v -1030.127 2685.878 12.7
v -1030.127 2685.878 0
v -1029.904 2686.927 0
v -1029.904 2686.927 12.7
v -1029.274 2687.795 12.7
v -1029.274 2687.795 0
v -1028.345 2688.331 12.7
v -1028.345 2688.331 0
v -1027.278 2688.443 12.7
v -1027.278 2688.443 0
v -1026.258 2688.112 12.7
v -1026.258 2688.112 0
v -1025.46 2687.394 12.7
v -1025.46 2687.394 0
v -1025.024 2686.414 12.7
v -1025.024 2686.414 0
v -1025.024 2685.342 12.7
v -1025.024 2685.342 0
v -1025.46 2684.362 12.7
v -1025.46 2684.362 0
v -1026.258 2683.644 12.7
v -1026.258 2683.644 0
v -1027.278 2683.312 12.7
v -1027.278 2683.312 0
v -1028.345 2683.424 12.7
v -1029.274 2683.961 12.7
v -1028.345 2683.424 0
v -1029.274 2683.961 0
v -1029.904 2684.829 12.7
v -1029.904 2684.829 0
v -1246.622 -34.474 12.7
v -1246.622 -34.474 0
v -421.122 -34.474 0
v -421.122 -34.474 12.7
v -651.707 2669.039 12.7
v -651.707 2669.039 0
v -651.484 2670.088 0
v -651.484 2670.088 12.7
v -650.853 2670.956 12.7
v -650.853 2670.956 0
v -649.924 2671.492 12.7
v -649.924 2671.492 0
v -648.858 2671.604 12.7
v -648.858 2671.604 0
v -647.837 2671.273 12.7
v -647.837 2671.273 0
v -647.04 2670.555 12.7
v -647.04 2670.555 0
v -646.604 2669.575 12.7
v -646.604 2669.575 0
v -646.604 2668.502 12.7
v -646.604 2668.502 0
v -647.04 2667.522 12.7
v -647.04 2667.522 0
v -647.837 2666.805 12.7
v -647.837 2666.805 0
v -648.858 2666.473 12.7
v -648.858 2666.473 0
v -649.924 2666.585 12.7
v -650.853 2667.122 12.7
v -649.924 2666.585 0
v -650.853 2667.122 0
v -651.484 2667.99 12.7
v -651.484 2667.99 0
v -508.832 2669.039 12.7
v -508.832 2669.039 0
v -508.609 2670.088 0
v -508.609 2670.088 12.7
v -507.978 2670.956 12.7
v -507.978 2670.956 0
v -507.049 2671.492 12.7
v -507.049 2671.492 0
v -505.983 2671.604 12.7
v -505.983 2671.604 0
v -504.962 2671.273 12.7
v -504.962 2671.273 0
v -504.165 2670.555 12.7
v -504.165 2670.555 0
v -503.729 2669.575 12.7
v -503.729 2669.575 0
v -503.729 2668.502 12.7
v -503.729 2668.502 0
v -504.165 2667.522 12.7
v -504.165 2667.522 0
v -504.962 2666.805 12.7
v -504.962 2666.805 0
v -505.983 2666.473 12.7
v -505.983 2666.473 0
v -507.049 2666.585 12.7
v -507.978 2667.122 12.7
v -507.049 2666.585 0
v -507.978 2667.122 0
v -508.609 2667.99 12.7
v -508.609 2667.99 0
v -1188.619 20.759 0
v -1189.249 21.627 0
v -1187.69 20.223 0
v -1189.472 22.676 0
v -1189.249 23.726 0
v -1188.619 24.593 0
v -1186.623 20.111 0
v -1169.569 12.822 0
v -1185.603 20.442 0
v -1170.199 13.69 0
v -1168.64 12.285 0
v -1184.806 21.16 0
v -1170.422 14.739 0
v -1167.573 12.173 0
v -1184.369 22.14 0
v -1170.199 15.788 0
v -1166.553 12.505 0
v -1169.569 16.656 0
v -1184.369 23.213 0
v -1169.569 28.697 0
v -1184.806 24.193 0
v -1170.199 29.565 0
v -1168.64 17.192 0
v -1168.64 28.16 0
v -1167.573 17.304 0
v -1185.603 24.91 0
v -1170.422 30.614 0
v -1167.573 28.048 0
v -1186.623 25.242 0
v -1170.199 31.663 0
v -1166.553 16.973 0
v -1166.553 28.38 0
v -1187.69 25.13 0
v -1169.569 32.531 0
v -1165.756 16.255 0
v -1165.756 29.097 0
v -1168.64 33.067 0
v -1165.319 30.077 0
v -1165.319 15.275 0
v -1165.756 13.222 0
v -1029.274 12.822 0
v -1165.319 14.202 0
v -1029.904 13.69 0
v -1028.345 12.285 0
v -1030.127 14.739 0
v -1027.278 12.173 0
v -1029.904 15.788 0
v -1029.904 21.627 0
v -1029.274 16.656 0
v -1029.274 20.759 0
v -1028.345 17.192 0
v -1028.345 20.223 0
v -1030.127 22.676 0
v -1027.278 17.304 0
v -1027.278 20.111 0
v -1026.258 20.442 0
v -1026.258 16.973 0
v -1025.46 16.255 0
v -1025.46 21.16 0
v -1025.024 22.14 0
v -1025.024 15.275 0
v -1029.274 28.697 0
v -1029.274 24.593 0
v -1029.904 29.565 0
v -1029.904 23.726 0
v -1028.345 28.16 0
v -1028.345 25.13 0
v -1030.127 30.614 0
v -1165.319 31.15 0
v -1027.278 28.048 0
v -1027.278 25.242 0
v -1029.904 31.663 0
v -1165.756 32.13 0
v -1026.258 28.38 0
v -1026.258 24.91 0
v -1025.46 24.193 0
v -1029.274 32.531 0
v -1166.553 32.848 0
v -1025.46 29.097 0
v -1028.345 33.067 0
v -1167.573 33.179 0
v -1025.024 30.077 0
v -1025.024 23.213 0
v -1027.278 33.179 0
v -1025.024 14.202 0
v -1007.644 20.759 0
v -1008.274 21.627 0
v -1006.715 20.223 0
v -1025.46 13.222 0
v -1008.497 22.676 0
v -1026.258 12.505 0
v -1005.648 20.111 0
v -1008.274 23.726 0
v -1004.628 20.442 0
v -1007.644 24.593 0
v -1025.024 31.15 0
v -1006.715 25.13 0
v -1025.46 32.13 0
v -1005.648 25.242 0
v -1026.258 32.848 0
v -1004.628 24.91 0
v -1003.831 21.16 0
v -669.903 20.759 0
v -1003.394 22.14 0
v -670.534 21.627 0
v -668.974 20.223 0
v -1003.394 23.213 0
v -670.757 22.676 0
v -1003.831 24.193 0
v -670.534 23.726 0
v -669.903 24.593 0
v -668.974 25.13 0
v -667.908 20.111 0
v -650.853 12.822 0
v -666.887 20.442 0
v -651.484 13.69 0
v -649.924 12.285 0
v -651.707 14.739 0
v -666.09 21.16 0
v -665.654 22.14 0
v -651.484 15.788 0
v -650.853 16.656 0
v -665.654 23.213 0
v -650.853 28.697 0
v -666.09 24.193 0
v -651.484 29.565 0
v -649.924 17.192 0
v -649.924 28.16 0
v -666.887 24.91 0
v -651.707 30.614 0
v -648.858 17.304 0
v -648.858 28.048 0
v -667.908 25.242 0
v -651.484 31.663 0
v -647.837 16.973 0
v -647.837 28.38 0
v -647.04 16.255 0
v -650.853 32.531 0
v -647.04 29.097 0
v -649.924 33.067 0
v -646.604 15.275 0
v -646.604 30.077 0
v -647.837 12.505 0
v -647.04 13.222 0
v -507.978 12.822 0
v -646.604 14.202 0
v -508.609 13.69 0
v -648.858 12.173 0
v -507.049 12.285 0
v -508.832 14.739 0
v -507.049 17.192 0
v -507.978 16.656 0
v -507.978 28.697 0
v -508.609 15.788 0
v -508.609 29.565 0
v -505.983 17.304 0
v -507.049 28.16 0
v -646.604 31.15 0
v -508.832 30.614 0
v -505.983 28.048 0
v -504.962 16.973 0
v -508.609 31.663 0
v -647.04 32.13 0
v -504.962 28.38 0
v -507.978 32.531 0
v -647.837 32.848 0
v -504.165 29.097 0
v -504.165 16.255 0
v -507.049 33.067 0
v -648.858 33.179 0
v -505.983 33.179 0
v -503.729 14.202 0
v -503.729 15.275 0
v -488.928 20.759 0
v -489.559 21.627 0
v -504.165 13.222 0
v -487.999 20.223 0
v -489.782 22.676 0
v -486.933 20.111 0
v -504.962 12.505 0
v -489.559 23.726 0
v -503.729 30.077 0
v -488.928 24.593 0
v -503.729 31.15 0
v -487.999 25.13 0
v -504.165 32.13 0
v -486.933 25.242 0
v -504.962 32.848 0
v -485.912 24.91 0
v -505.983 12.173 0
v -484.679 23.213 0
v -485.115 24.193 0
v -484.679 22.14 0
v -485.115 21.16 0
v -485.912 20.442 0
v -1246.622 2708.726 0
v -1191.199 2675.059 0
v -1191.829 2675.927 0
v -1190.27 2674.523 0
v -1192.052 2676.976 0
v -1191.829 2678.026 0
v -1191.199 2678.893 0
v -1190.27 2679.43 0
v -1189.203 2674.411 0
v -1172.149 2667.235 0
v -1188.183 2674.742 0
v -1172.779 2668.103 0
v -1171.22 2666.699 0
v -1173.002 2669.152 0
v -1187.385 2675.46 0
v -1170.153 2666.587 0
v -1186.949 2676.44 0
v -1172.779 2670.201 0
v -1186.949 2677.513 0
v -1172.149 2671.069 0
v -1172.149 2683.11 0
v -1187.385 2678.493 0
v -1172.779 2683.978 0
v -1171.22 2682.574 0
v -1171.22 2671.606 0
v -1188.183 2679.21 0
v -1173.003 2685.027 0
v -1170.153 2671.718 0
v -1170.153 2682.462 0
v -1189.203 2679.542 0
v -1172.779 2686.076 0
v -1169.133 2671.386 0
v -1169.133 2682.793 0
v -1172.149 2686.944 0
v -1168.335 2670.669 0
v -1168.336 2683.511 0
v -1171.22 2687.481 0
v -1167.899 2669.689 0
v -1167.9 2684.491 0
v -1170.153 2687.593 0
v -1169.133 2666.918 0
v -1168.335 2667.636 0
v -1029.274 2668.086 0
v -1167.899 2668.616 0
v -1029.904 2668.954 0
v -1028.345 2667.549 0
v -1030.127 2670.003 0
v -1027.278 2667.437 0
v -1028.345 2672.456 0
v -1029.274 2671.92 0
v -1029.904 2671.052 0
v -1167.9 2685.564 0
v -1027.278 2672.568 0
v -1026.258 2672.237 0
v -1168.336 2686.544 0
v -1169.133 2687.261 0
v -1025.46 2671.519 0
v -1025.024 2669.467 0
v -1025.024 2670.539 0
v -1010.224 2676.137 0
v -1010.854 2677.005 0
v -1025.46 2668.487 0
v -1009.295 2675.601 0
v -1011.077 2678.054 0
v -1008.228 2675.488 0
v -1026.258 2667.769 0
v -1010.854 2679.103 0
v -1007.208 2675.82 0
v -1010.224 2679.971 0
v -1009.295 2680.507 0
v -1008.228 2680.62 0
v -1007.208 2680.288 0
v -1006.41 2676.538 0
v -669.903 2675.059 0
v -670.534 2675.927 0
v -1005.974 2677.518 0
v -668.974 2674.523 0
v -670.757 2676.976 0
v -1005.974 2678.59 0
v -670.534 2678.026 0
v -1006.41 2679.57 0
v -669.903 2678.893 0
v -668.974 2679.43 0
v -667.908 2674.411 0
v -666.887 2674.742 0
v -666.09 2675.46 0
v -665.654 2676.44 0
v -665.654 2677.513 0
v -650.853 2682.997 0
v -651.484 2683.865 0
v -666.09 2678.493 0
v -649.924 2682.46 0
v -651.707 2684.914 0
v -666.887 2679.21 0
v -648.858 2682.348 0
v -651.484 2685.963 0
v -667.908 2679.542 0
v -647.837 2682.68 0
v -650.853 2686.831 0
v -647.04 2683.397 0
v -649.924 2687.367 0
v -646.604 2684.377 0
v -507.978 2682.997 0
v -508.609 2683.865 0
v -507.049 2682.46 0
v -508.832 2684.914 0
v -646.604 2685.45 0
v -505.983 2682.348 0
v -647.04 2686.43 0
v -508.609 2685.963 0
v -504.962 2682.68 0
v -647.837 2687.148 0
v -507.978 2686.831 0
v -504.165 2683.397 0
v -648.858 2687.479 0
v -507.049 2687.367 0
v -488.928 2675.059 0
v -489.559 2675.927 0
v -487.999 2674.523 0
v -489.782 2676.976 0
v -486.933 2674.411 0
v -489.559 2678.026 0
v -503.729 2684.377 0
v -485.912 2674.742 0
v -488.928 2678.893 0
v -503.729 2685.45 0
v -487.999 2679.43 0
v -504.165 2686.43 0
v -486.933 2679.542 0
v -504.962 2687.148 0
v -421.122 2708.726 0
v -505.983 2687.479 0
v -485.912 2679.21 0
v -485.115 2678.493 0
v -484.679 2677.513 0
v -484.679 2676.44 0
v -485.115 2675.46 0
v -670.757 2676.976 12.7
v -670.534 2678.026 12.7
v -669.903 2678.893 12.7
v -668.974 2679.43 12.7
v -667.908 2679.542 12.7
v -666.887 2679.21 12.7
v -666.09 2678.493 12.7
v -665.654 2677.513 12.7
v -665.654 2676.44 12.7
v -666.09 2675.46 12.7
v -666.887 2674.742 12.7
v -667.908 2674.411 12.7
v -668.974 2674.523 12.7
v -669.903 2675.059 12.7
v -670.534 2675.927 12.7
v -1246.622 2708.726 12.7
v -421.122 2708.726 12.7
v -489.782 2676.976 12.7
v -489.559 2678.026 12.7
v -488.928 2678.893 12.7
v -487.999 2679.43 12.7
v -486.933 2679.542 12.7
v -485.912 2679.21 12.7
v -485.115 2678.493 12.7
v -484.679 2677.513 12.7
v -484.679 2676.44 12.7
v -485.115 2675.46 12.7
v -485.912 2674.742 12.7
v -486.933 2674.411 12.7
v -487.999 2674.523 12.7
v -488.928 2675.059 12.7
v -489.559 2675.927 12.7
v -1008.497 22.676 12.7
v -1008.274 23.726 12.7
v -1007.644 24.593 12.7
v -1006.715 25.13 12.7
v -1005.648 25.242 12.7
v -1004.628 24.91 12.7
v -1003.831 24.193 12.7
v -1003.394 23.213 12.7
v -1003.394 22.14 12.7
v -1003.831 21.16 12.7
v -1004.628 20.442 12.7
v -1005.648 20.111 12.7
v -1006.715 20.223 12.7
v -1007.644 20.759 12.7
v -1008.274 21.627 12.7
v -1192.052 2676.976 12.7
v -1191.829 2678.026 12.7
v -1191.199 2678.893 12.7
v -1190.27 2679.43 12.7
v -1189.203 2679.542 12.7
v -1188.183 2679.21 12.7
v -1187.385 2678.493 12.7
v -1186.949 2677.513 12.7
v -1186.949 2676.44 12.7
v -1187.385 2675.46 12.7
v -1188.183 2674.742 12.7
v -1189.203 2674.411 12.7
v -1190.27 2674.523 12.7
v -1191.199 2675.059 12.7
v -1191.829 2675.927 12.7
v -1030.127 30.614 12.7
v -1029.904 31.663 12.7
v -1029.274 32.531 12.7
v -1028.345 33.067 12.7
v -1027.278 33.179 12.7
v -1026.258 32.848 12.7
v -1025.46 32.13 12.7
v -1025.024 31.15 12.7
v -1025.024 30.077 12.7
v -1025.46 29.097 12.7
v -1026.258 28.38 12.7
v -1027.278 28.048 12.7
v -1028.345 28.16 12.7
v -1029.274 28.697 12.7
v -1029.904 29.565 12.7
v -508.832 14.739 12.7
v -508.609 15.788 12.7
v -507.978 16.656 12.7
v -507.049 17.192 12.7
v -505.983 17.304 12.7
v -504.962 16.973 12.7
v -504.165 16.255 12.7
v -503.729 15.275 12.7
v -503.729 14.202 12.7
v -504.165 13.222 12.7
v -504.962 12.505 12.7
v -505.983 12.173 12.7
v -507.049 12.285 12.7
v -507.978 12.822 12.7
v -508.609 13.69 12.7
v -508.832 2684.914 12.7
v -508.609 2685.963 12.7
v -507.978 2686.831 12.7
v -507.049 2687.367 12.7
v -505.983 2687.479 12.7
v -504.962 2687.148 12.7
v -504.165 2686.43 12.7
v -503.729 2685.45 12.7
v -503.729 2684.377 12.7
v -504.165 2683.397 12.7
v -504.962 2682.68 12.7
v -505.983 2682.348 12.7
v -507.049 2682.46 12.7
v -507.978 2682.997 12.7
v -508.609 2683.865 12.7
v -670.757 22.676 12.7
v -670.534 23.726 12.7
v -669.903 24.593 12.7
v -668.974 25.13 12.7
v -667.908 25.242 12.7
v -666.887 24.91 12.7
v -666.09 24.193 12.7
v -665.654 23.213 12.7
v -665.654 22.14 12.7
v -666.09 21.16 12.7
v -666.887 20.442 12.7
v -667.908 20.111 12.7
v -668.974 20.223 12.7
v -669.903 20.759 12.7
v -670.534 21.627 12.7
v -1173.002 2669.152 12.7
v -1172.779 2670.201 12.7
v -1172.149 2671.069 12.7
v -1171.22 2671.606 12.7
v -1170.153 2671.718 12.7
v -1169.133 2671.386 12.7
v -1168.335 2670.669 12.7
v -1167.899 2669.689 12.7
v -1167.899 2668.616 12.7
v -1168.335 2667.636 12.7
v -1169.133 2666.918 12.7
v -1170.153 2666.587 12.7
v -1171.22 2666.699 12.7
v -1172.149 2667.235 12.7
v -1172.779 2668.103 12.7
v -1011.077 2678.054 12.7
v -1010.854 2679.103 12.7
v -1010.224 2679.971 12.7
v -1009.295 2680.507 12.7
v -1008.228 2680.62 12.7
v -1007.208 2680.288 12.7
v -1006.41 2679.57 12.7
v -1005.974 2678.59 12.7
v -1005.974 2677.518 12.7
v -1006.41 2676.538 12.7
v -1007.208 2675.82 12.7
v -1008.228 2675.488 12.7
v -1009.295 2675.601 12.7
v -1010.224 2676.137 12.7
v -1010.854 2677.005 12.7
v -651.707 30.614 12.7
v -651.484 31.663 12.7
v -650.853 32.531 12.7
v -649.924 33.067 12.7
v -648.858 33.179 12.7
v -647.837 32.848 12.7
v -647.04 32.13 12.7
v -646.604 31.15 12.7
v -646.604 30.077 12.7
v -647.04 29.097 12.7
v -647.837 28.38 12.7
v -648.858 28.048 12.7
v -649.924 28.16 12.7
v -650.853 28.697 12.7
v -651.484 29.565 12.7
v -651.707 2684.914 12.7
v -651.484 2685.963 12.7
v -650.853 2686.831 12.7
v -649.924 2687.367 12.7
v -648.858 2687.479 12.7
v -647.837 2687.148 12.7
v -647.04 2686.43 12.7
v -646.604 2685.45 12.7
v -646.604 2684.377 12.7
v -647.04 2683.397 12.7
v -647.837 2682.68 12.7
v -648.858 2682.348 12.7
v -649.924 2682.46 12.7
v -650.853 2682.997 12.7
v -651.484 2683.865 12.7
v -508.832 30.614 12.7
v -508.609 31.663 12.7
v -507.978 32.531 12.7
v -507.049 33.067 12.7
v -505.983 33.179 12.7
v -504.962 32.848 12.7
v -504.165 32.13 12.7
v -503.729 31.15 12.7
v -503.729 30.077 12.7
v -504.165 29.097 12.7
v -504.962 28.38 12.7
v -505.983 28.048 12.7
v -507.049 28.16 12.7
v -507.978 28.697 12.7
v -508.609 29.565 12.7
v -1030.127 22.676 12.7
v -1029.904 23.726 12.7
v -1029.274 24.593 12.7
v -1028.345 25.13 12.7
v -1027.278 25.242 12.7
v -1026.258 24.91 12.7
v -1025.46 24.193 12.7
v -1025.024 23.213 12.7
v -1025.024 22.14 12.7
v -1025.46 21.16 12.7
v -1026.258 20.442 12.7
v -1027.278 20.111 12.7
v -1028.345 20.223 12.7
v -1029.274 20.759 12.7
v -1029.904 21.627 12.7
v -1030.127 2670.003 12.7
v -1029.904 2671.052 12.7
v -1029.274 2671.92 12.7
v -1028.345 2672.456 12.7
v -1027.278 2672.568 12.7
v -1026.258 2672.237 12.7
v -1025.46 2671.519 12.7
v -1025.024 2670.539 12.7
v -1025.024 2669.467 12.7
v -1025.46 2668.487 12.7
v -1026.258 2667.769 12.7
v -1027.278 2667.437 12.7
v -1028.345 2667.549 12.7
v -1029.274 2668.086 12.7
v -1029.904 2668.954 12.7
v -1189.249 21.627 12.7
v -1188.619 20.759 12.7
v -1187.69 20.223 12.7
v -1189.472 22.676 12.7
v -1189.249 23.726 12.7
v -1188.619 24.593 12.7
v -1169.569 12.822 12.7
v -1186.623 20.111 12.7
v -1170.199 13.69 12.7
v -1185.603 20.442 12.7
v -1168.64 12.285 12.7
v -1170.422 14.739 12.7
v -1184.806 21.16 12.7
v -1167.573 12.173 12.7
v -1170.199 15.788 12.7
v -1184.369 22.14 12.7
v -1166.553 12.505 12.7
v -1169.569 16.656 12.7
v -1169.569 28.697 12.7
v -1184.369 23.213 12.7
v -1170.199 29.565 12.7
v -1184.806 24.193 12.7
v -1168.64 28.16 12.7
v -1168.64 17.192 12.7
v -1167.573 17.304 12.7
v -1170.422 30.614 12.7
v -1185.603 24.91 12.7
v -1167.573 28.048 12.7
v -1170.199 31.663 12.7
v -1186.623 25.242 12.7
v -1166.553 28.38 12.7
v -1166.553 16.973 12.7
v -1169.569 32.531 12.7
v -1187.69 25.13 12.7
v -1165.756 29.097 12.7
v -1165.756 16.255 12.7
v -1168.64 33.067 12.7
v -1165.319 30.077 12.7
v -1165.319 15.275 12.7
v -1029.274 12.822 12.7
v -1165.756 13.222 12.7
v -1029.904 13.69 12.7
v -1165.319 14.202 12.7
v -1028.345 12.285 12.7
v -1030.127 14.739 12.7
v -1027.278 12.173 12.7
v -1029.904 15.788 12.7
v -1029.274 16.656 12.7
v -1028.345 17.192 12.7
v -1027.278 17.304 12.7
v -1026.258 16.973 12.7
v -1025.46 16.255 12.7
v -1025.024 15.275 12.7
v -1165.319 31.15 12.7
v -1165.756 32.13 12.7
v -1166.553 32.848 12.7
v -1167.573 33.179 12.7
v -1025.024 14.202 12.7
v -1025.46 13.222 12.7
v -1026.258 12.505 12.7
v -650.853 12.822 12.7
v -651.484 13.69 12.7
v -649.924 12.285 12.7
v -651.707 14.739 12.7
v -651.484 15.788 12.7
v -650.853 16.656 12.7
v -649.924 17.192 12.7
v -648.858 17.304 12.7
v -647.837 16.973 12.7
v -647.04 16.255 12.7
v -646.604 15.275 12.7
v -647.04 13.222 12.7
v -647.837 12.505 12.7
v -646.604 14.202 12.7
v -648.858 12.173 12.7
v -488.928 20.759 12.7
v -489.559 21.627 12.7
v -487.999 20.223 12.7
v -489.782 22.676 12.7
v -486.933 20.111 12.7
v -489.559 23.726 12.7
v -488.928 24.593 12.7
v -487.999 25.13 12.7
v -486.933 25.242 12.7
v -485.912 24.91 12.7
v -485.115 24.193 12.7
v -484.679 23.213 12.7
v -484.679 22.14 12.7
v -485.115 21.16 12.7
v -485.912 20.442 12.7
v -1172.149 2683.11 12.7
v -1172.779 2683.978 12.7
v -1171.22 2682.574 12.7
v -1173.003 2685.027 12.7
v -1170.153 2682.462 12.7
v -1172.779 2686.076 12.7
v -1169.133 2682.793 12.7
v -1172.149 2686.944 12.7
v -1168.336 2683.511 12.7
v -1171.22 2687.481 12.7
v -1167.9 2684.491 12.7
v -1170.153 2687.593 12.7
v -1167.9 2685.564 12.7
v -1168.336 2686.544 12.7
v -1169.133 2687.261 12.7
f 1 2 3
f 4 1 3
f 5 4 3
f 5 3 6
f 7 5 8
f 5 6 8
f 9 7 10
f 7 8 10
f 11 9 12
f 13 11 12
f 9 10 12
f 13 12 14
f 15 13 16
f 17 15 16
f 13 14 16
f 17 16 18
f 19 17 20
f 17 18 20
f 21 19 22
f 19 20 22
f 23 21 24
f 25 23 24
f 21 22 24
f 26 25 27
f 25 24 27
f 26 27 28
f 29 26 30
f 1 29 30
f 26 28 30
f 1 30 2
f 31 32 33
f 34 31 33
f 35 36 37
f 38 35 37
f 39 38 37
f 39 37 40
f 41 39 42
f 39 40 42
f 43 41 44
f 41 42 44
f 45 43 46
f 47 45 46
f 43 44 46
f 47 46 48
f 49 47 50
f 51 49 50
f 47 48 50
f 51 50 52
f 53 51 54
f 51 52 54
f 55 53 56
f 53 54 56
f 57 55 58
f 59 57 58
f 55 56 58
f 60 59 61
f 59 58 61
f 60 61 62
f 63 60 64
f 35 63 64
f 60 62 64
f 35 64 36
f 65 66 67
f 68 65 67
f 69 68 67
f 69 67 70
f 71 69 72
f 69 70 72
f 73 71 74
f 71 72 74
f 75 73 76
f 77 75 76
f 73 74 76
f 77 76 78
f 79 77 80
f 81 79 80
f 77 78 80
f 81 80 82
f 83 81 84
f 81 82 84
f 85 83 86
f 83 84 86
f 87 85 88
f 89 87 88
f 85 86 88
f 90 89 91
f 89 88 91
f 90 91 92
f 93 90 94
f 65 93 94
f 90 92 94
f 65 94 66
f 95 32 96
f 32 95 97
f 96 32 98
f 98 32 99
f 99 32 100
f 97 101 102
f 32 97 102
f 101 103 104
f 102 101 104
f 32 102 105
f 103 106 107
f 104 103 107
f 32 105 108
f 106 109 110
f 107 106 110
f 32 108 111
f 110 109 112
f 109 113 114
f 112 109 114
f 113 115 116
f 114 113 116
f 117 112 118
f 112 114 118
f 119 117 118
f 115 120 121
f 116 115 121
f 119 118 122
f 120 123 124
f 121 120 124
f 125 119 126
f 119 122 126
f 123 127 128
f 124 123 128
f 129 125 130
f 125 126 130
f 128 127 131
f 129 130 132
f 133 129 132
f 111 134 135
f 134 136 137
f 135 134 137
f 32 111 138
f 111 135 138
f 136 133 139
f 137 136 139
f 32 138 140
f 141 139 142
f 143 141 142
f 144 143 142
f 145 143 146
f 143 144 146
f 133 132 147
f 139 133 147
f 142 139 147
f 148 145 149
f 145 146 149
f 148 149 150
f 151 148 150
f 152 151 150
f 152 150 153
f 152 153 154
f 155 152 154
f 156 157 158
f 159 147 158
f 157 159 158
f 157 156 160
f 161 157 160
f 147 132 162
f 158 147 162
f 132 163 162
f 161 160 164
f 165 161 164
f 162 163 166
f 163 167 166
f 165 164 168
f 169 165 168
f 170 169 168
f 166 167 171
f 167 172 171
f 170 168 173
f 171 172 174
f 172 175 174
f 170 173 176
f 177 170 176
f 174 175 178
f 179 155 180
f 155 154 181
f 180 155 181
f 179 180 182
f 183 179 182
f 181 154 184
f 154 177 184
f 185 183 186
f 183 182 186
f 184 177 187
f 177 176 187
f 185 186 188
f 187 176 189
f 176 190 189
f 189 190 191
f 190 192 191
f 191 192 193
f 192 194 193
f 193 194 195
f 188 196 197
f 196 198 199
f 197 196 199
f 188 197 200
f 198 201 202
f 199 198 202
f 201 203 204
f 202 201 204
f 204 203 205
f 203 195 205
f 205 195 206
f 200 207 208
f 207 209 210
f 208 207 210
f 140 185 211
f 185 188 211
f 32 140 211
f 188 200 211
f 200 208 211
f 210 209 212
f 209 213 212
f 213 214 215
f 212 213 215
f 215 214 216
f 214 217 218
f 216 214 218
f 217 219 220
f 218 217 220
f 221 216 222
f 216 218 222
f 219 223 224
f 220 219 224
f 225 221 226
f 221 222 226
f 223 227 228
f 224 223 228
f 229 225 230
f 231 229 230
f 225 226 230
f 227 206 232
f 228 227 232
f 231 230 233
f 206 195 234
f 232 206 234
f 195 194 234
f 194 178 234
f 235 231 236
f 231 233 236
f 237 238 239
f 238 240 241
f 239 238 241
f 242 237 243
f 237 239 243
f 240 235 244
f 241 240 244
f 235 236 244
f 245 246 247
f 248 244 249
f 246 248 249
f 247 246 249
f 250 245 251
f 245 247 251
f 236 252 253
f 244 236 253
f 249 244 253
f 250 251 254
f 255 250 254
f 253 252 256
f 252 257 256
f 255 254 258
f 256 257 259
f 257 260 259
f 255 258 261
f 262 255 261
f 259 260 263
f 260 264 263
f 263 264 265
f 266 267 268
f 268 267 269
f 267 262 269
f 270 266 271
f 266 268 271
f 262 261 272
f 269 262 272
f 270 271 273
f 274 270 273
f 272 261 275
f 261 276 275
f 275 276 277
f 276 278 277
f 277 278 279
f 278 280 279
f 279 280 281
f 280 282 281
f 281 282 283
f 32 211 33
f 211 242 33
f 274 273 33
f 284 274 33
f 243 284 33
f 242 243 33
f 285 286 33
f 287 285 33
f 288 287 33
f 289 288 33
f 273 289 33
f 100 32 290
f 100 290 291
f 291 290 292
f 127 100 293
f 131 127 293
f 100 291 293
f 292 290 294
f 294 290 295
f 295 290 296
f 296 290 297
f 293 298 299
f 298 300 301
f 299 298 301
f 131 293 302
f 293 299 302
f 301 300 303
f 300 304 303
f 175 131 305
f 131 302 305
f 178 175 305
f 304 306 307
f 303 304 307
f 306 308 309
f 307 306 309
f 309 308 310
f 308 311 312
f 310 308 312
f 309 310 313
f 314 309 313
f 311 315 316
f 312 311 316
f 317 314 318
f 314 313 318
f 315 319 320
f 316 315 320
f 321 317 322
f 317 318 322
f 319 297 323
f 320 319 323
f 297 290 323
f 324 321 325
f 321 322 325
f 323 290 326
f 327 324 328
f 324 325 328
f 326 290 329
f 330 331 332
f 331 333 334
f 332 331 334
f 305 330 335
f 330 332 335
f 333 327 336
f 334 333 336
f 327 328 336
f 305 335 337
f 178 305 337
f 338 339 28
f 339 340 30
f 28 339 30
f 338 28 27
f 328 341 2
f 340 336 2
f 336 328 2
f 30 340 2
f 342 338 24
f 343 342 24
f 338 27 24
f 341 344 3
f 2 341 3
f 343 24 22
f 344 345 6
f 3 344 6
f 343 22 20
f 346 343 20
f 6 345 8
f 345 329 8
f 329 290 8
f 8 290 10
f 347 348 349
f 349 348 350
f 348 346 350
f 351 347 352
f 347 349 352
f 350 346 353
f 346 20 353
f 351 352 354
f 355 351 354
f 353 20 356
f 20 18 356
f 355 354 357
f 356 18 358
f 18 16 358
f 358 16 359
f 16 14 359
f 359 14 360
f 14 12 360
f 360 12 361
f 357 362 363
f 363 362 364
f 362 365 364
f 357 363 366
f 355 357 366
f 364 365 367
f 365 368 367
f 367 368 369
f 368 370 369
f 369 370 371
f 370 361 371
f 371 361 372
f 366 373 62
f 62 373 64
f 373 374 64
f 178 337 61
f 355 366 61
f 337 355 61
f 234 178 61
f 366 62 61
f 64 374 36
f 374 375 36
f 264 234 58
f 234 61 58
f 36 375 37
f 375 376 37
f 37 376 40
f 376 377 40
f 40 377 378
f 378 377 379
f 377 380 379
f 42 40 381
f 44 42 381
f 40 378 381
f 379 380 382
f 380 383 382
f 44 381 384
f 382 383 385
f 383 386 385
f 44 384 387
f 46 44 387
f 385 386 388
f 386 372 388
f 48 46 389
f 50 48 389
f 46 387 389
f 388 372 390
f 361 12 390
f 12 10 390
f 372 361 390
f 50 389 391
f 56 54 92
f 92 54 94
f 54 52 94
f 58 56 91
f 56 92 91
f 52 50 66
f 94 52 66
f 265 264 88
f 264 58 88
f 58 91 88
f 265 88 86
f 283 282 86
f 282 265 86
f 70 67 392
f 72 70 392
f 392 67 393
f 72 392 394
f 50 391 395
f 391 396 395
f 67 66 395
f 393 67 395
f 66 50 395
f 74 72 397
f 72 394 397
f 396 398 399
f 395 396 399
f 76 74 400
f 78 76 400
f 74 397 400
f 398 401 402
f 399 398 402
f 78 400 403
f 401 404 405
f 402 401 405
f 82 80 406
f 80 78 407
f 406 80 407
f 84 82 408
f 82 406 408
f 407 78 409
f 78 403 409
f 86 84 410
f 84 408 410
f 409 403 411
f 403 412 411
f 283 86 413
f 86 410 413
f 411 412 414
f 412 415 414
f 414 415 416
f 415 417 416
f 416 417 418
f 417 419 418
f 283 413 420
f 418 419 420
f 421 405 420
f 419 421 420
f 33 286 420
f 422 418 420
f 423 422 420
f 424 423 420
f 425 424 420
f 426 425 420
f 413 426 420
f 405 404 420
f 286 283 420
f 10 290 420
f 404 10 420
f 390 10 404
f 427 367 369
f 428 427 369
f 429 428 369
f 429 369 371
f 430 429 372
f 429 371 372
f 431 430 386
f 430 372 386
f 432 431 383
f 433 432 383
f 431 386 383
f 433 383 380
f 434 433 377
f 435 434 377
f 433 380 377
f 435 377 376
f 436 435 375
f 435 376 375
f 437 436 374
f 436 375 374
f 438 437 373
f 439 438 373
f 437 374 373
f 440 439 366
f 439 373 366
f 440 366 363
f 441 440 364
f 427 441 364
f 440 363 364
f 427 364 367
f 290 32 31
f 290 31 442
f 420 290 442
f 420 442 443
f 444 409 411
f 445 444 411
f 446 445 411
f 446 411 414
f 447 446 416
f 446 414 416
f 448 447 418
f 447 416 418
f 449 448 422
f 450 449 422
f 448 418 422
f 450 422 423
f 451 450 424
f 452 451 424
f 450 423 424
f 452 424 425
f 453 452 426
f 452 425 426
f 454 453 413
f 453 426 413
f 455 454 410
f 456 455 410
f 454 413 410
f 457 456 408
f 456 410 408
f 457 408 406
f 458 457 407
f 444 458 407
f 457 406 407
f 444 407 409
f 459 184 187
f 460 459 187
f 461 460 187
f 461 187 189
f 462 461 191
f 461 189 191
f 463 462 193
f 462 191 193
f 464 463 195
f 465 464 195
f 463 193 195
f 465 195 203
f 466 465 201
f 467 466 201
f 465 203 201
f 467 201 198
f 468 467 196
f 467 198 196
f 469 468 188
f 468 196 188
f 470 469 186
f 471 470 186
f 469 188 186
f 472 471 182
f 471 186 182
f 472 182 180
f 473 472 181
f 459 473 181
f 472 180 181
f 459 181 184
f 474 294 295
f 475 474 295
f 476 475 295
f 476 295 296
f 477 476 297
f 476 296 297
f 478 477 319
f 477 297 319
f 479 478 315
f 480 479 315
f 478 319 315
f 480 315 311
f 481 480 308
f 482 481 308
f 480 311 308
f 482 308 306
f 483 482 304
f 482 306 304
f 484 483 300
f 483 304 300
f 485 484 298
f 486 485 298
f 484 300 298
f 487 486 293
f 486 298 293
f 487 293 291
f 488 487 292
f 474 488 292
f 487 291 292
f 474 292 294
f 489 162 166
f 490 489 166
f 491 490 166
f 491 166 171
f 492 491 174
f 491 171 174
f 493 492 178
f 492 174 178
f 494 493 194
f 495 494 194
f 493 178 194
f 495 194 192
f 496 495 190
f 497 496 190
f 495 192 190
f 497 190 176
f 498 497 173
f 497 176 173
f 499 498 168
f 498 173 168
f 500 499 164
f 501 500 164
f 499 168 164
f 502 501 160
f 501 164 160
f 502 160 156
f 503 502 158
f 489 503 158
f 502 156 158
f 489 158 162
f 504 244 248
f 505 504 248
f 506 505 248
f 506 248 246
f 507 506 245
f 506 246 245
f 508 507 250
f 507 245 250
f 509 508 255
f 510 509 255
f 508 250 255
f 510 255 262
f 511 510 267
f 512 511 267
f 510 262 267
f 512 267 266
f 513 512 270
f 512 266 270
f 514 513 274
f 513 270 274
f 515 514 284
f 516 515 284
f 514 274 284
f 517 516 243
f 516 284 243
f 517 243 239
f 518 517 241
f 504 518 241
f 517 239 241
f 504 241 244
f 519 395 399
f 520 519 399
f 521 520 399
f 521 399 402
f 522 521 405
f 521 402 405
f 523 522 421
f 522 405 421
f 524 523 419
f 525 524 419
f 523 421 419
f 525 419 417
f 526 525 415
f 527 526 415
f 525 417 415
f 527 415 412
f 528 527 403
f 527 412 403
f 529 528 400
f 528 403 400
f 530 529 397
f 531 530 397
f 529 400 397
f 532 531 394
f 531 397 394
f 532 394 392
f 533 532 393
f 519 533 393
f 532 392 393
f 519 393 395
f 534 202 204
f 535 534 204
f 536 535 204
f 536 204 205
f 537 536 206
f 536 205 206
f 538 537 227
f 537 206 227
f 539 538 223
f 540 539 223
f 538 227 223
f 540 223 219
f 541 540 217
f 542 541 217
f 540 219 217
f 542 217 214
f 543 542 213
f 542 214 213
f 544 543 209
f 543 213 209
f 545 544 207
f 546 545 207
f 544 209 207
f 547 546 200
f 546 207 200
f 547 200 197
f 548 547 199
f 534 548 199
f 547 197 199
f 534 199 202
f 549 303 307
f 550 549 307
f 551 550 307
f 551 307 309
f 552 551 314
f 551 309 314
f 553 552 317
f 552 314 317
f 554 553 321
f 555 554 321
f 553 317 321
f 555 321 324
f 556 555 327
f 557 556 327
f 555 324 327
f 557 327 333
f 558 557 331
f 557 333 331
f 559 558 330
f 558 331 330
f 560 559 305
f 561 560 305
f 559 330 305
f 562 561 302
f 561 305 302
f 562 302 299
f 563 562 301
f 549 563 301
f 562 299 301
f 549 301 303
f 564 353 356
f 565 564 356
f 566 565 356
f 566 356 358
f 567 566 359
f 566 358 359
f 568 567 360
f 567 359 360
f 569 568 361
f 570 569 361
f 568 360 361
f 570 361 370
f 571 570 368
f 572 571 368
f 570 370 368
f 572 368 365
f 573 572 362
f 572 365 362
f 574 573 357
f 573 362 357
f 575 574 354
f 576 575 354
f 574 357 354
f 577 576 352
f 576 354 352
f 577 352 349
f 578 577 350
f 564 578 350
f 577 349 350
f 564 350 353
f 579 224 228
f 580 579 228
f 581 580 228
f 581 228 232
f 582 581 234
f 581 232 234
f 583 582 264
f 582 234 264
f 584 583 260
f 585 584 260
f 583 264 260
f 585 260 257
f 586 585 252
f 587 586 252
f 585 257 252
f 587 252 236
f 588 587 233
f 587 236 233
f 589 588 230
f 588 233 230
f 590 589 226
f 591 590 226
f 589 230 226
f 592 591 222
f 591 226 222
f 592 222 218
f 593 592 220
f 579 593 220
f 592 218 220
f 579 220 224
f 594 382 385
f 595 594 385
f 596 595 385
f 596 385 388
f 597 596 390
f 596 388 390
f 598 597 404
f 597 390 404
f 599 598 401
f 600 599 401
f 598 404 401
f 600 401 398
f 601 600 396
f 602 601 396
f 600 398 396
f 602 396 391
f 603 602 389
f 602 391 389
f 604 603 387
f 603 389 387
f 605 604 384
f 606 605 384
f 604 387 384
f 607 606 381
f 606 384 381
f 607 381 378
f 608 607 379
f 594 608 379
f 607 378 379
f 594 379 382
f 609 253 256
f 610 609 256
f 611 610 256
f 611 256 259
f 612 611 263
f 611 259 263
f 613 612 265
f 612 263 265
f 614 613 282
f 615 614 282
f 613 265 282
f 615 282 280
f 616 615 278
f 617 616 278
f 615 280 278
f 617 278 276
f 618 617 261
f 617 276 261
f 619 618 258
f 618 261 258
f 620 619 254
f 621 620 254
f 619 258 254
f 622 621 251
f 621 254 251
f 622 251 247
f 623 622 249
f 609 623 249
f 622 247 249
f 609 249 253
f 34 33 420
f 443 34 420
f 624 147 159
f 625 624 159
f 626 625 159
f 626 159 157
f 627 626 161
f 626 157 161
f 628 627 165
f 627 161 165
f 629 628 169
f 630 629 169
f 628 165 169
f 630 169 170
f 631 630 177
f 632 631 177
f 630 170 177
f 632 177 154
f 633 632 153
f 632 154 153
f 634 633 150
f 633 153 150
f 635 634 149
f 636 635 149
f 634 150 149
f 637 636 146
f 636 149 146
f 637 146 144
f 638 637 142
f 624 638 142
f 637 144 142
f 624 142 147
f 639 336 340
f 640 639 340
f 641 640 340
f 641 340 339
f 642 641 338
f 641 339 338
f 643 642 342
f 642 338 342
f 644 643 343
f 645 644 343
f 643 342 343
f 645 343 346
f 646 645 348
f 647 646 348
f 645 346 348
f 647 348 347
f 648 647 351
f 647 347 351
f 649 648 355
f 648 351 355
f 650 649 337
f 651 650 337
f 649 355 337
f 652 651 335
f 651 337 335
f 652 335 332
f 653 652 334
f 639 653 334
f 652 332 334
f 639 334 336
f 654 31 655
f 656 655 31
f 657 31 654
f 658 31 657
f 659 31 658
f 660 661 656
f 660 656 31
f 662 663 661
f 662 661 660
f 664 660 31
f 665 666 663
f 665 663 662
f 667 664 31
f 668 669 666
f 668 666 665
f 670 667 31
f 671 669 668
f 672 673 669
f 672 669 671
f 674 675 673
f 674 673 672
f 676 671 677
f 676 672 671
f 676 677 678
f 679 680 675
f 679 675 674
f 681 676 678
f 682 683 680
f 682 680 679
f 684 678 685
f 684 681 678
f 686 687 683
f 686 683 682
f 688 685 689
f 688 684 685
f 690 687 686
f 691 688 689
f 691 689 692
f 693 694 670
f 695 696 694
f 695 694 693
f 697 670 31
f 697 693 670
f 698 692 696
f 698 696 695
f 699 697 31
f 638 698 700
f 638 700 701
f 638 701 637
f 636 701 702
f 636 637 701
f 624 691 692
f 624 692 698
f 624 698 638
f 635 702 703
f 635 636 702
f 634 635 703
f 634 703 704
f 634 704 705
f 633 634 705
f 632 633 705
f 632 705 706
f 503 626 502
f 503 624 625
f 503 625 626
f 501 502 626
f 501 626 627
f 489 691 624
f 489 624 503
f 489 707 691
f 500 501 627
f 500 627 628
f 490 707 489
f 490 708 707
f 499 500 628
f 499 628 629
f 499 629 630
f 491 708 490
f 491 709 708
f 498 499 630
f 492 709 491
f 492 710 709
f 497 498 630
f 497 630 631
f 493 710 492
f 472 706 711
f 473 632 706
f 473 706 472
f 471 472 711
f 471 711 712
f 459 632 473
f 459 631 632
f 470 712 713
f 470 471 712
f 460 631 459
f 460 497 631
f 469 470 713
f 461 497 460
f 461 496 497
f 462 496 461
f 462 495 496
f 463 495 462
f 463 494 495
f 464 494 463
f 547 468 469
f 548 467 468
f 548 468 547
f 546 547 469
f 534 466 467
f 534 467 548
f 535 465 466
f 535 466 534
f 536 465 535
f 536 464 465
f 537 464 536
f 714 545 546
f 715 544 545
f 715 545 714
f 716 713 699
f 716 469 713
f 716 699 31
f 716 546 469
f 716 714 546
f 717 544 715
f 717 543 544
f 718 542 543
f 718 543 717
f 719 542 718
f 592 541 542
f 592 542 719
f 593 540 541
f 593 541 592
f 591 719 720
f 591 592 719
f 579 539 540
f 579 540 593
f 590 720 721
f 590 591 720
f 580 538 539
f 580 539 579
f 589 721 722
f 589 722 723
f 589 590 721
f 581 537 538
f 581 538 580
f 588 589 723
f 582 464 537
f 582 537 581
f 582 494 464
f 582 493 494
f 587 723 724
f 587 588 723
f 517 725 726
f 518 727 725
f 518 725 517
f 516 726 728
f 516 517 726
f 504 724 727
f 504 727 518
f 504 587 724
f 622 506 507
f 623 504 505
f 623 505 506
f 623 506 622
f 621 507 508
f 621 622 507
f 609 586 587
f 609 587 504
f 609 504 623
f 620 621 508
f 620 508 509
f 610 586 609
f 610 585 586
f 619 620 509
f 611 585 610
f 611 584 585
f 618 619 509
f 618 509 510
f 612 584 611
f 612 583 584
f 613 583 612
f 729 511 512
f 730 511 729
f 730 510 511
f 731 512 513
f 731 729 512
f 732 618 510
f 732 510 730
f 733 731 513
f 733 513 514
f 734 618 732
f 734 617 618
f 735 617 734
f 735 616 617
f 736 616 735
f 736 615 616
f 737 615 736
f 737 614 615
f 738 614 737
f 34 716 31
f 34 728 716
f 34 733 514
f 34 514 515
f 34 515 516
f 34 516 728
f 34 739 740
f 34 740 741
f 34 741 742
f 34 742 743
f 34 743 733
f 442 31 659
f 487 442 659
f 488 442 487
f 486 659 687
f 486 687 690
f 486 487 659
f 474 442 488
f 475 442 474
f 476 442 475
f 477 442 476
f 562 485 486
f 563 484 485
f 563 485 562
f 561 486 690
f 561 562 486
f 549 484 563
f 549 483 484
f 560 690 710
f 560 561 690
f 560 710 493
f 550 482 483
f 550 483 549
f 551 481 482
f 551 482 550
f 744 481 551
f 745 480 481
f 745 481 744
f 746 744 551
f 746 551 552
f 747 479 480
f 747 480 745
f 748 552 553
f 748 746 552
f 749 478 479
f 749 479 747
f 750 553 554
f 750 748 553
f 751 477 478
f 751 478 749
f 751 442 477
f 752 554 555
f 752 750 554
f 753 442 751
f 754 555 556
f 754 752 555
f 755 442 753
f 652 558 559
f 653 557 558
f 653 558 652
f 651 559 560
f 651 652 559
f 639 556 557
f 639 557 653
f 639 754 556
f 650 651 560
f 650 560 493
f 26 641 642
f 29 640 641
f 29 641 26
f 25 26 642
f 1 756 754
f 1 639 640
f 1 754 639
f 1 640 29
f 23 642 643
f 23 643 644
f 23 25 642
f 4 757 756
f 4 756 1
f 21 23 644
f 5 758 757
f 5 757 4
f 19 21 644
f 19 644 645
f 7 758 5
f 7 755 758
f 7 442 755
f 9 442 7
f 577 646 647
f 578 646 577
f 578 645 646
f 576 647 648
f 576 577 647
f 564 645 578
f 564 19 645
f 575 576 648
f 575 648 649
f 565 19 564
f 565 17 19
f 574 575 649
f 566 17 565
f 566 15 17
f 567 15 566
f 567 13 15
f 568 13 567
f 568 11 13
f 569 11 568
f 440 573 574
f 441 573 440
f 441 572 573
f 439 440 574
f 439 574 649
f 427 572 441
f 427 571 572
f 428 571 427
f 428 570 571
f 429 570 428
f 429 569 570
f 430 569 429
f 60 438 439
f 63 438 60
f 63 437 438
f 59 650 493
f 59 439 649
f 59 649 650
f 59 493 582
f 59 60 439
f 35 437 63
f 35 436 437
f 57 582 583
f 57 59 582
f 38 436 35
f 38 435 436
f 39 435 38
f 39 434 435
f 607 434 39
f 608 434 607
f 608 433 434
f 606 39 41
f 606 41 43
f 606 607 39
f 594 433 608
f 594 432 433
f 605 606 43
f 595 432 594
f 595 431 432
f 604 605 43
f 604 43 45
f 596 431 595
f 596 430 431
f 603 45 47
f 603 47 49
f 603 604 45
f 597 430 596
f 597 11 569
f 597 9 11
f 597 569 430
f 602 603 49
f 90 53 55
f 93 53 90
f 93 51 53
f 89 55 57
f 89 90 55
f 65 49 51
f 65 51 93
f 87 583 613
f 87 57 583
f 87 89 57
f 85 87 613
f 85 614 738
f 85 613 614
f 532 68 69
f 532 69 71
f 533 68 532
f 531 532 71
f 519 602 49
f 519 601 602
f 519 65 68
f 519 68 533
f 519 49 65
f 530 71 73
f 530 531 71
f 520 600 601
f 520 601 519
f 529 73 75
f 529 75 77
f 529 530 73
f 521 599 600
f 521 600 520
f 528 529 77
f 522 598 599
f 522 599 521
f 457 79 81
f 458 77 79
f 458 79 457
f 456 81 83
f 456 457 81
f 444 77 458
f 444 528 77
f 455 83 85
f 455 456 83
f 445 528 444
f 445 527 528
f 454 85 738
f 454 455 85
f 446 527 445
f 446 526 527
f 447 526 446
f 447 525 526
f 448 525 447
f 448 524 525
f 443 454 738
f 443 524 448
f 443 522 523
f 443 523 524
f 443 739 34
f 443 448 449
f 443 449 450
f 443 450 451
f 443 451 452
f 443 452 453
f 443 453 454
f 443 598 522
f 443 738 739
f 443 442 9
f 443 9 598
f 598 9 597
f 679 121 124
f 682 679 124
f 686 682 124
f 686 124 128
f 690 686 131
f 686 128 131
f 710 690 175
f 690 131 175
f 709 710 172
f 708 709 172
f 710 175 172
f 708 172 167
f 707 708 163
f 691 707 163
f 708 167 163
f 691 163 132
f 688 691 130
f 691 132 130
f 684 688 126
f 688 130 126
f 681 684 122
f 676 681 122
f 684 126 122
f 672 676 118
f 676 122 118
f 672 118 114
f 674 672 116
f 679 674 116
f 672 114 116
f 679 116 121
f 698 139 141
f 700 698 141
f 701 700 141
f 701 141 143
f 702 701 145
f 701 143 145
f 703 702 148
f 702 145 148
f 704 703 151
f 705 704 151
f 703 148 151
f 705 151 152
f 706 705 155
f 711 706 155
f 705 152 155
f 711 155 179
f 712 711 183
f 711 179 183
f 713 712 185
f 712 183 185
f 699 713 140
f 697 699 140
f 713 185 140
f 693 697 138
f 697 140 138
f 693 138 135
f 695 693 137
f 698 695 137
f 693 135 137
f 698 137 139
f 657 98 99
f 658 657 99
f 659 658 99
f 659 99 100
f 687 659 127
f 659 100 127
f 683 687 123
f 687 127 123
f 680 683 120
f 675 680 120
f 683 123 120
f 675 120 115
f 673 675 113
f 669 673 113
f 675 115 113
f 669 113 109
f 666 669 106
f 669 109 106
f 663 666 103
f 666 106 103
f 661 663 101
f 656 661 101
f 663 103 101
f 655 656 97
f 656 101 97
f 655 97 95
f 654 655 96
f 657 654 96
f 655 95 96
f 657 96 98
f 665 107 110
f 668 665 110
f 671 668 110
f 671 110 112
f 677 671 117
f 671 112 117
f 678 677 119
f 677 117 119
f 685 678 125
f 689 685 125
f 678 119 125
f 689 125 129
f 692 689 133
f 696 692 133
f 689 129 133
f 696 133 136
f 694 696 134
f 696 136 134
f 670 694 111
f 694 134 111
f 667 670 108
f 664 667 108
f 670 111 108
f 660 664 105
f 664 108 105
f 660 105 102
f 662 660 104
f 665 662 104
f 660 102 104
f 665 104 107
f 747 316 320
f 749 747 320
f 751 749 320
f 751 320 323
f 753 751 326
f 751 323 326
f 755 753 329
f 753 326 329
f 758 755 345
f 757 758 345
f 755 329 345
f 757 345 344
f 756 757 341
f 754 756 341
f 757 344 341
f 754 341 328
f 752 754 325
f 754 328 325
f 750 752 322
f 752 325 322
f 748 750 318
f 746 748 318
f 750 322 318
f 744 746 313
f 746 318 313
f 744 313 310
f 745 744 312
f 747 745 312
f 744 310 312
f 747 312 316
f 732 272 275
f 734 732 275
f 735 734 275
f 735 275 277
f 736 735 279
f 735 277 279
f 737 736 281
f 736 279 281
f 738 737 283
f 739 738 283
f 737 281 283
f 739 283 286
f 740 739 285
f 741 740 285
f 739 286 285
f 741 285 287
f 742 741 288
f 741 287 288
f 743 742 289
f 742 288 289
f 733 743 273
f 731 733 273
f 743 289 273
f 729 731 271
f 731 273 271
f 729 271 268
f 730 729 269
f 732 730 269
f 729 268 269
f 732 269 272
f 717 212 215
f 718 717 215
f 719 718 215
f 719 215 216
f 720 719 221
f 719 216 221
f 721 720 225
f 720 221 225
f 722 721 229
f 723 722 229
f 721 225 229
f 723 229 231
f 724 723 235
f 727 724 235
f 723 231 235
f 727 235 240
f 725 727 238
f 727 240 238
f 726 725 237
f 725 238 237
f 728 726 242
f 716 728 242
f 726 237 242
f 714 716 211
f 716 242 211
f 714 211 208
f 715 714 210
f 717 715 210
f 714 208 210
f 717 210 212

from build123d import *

# Parameters (mm, degrees)
F0_W     = 825.5
F0_H     = 2743.2
F1_DEPTH = 12.7
F3_D     = 5.159375


with BuildPart() as f1:
    # F0 (on Top) → F1 (new body)
    with BuildSketch(Plane.XY):
        with Locations((-833.872486, 1337.126257)):
            Rectangle(F0_W, F0_H)
    extrude(amount=F1_DEPTH)

    # F3 (through all)
    with Locations(Plane.XY.offset(12.7)):
        with Locations((-487.202173, 2676.976257), (-668.177173, 2676.976257), (-649.127173, 2684.913757), (-1189.472486, 2676.976257), (-1027.547486, 2670.002875), (-1027.547486, 2685.877875), (-506.252173, 2684.913757), (-1008.497486, 2678.053958), (-1170.422824, 2685.027199), (-649.127173, 2669.038757), (-1170.422486, 2669.152199), (-506.252173, 2669.038757), (-1005.917798, 22.676257), (-1027.547486, 14.738757), (-1167.842798, 14.738757), (-668.177173, 22.676257), (-649.127173, 14.738757), (-1027.547486, 30.613757), (-649.127173, 30.613757), (-506.252173, 14.738757), (-1167.842798, 30.613757), (-1186.892798, 22.676257), (-506.252173, 30.613757), (-487.202173, 22.676257), (-1027.547486, 22.676257)):
            Hole(F3_D / 2)


solid = f1.part
